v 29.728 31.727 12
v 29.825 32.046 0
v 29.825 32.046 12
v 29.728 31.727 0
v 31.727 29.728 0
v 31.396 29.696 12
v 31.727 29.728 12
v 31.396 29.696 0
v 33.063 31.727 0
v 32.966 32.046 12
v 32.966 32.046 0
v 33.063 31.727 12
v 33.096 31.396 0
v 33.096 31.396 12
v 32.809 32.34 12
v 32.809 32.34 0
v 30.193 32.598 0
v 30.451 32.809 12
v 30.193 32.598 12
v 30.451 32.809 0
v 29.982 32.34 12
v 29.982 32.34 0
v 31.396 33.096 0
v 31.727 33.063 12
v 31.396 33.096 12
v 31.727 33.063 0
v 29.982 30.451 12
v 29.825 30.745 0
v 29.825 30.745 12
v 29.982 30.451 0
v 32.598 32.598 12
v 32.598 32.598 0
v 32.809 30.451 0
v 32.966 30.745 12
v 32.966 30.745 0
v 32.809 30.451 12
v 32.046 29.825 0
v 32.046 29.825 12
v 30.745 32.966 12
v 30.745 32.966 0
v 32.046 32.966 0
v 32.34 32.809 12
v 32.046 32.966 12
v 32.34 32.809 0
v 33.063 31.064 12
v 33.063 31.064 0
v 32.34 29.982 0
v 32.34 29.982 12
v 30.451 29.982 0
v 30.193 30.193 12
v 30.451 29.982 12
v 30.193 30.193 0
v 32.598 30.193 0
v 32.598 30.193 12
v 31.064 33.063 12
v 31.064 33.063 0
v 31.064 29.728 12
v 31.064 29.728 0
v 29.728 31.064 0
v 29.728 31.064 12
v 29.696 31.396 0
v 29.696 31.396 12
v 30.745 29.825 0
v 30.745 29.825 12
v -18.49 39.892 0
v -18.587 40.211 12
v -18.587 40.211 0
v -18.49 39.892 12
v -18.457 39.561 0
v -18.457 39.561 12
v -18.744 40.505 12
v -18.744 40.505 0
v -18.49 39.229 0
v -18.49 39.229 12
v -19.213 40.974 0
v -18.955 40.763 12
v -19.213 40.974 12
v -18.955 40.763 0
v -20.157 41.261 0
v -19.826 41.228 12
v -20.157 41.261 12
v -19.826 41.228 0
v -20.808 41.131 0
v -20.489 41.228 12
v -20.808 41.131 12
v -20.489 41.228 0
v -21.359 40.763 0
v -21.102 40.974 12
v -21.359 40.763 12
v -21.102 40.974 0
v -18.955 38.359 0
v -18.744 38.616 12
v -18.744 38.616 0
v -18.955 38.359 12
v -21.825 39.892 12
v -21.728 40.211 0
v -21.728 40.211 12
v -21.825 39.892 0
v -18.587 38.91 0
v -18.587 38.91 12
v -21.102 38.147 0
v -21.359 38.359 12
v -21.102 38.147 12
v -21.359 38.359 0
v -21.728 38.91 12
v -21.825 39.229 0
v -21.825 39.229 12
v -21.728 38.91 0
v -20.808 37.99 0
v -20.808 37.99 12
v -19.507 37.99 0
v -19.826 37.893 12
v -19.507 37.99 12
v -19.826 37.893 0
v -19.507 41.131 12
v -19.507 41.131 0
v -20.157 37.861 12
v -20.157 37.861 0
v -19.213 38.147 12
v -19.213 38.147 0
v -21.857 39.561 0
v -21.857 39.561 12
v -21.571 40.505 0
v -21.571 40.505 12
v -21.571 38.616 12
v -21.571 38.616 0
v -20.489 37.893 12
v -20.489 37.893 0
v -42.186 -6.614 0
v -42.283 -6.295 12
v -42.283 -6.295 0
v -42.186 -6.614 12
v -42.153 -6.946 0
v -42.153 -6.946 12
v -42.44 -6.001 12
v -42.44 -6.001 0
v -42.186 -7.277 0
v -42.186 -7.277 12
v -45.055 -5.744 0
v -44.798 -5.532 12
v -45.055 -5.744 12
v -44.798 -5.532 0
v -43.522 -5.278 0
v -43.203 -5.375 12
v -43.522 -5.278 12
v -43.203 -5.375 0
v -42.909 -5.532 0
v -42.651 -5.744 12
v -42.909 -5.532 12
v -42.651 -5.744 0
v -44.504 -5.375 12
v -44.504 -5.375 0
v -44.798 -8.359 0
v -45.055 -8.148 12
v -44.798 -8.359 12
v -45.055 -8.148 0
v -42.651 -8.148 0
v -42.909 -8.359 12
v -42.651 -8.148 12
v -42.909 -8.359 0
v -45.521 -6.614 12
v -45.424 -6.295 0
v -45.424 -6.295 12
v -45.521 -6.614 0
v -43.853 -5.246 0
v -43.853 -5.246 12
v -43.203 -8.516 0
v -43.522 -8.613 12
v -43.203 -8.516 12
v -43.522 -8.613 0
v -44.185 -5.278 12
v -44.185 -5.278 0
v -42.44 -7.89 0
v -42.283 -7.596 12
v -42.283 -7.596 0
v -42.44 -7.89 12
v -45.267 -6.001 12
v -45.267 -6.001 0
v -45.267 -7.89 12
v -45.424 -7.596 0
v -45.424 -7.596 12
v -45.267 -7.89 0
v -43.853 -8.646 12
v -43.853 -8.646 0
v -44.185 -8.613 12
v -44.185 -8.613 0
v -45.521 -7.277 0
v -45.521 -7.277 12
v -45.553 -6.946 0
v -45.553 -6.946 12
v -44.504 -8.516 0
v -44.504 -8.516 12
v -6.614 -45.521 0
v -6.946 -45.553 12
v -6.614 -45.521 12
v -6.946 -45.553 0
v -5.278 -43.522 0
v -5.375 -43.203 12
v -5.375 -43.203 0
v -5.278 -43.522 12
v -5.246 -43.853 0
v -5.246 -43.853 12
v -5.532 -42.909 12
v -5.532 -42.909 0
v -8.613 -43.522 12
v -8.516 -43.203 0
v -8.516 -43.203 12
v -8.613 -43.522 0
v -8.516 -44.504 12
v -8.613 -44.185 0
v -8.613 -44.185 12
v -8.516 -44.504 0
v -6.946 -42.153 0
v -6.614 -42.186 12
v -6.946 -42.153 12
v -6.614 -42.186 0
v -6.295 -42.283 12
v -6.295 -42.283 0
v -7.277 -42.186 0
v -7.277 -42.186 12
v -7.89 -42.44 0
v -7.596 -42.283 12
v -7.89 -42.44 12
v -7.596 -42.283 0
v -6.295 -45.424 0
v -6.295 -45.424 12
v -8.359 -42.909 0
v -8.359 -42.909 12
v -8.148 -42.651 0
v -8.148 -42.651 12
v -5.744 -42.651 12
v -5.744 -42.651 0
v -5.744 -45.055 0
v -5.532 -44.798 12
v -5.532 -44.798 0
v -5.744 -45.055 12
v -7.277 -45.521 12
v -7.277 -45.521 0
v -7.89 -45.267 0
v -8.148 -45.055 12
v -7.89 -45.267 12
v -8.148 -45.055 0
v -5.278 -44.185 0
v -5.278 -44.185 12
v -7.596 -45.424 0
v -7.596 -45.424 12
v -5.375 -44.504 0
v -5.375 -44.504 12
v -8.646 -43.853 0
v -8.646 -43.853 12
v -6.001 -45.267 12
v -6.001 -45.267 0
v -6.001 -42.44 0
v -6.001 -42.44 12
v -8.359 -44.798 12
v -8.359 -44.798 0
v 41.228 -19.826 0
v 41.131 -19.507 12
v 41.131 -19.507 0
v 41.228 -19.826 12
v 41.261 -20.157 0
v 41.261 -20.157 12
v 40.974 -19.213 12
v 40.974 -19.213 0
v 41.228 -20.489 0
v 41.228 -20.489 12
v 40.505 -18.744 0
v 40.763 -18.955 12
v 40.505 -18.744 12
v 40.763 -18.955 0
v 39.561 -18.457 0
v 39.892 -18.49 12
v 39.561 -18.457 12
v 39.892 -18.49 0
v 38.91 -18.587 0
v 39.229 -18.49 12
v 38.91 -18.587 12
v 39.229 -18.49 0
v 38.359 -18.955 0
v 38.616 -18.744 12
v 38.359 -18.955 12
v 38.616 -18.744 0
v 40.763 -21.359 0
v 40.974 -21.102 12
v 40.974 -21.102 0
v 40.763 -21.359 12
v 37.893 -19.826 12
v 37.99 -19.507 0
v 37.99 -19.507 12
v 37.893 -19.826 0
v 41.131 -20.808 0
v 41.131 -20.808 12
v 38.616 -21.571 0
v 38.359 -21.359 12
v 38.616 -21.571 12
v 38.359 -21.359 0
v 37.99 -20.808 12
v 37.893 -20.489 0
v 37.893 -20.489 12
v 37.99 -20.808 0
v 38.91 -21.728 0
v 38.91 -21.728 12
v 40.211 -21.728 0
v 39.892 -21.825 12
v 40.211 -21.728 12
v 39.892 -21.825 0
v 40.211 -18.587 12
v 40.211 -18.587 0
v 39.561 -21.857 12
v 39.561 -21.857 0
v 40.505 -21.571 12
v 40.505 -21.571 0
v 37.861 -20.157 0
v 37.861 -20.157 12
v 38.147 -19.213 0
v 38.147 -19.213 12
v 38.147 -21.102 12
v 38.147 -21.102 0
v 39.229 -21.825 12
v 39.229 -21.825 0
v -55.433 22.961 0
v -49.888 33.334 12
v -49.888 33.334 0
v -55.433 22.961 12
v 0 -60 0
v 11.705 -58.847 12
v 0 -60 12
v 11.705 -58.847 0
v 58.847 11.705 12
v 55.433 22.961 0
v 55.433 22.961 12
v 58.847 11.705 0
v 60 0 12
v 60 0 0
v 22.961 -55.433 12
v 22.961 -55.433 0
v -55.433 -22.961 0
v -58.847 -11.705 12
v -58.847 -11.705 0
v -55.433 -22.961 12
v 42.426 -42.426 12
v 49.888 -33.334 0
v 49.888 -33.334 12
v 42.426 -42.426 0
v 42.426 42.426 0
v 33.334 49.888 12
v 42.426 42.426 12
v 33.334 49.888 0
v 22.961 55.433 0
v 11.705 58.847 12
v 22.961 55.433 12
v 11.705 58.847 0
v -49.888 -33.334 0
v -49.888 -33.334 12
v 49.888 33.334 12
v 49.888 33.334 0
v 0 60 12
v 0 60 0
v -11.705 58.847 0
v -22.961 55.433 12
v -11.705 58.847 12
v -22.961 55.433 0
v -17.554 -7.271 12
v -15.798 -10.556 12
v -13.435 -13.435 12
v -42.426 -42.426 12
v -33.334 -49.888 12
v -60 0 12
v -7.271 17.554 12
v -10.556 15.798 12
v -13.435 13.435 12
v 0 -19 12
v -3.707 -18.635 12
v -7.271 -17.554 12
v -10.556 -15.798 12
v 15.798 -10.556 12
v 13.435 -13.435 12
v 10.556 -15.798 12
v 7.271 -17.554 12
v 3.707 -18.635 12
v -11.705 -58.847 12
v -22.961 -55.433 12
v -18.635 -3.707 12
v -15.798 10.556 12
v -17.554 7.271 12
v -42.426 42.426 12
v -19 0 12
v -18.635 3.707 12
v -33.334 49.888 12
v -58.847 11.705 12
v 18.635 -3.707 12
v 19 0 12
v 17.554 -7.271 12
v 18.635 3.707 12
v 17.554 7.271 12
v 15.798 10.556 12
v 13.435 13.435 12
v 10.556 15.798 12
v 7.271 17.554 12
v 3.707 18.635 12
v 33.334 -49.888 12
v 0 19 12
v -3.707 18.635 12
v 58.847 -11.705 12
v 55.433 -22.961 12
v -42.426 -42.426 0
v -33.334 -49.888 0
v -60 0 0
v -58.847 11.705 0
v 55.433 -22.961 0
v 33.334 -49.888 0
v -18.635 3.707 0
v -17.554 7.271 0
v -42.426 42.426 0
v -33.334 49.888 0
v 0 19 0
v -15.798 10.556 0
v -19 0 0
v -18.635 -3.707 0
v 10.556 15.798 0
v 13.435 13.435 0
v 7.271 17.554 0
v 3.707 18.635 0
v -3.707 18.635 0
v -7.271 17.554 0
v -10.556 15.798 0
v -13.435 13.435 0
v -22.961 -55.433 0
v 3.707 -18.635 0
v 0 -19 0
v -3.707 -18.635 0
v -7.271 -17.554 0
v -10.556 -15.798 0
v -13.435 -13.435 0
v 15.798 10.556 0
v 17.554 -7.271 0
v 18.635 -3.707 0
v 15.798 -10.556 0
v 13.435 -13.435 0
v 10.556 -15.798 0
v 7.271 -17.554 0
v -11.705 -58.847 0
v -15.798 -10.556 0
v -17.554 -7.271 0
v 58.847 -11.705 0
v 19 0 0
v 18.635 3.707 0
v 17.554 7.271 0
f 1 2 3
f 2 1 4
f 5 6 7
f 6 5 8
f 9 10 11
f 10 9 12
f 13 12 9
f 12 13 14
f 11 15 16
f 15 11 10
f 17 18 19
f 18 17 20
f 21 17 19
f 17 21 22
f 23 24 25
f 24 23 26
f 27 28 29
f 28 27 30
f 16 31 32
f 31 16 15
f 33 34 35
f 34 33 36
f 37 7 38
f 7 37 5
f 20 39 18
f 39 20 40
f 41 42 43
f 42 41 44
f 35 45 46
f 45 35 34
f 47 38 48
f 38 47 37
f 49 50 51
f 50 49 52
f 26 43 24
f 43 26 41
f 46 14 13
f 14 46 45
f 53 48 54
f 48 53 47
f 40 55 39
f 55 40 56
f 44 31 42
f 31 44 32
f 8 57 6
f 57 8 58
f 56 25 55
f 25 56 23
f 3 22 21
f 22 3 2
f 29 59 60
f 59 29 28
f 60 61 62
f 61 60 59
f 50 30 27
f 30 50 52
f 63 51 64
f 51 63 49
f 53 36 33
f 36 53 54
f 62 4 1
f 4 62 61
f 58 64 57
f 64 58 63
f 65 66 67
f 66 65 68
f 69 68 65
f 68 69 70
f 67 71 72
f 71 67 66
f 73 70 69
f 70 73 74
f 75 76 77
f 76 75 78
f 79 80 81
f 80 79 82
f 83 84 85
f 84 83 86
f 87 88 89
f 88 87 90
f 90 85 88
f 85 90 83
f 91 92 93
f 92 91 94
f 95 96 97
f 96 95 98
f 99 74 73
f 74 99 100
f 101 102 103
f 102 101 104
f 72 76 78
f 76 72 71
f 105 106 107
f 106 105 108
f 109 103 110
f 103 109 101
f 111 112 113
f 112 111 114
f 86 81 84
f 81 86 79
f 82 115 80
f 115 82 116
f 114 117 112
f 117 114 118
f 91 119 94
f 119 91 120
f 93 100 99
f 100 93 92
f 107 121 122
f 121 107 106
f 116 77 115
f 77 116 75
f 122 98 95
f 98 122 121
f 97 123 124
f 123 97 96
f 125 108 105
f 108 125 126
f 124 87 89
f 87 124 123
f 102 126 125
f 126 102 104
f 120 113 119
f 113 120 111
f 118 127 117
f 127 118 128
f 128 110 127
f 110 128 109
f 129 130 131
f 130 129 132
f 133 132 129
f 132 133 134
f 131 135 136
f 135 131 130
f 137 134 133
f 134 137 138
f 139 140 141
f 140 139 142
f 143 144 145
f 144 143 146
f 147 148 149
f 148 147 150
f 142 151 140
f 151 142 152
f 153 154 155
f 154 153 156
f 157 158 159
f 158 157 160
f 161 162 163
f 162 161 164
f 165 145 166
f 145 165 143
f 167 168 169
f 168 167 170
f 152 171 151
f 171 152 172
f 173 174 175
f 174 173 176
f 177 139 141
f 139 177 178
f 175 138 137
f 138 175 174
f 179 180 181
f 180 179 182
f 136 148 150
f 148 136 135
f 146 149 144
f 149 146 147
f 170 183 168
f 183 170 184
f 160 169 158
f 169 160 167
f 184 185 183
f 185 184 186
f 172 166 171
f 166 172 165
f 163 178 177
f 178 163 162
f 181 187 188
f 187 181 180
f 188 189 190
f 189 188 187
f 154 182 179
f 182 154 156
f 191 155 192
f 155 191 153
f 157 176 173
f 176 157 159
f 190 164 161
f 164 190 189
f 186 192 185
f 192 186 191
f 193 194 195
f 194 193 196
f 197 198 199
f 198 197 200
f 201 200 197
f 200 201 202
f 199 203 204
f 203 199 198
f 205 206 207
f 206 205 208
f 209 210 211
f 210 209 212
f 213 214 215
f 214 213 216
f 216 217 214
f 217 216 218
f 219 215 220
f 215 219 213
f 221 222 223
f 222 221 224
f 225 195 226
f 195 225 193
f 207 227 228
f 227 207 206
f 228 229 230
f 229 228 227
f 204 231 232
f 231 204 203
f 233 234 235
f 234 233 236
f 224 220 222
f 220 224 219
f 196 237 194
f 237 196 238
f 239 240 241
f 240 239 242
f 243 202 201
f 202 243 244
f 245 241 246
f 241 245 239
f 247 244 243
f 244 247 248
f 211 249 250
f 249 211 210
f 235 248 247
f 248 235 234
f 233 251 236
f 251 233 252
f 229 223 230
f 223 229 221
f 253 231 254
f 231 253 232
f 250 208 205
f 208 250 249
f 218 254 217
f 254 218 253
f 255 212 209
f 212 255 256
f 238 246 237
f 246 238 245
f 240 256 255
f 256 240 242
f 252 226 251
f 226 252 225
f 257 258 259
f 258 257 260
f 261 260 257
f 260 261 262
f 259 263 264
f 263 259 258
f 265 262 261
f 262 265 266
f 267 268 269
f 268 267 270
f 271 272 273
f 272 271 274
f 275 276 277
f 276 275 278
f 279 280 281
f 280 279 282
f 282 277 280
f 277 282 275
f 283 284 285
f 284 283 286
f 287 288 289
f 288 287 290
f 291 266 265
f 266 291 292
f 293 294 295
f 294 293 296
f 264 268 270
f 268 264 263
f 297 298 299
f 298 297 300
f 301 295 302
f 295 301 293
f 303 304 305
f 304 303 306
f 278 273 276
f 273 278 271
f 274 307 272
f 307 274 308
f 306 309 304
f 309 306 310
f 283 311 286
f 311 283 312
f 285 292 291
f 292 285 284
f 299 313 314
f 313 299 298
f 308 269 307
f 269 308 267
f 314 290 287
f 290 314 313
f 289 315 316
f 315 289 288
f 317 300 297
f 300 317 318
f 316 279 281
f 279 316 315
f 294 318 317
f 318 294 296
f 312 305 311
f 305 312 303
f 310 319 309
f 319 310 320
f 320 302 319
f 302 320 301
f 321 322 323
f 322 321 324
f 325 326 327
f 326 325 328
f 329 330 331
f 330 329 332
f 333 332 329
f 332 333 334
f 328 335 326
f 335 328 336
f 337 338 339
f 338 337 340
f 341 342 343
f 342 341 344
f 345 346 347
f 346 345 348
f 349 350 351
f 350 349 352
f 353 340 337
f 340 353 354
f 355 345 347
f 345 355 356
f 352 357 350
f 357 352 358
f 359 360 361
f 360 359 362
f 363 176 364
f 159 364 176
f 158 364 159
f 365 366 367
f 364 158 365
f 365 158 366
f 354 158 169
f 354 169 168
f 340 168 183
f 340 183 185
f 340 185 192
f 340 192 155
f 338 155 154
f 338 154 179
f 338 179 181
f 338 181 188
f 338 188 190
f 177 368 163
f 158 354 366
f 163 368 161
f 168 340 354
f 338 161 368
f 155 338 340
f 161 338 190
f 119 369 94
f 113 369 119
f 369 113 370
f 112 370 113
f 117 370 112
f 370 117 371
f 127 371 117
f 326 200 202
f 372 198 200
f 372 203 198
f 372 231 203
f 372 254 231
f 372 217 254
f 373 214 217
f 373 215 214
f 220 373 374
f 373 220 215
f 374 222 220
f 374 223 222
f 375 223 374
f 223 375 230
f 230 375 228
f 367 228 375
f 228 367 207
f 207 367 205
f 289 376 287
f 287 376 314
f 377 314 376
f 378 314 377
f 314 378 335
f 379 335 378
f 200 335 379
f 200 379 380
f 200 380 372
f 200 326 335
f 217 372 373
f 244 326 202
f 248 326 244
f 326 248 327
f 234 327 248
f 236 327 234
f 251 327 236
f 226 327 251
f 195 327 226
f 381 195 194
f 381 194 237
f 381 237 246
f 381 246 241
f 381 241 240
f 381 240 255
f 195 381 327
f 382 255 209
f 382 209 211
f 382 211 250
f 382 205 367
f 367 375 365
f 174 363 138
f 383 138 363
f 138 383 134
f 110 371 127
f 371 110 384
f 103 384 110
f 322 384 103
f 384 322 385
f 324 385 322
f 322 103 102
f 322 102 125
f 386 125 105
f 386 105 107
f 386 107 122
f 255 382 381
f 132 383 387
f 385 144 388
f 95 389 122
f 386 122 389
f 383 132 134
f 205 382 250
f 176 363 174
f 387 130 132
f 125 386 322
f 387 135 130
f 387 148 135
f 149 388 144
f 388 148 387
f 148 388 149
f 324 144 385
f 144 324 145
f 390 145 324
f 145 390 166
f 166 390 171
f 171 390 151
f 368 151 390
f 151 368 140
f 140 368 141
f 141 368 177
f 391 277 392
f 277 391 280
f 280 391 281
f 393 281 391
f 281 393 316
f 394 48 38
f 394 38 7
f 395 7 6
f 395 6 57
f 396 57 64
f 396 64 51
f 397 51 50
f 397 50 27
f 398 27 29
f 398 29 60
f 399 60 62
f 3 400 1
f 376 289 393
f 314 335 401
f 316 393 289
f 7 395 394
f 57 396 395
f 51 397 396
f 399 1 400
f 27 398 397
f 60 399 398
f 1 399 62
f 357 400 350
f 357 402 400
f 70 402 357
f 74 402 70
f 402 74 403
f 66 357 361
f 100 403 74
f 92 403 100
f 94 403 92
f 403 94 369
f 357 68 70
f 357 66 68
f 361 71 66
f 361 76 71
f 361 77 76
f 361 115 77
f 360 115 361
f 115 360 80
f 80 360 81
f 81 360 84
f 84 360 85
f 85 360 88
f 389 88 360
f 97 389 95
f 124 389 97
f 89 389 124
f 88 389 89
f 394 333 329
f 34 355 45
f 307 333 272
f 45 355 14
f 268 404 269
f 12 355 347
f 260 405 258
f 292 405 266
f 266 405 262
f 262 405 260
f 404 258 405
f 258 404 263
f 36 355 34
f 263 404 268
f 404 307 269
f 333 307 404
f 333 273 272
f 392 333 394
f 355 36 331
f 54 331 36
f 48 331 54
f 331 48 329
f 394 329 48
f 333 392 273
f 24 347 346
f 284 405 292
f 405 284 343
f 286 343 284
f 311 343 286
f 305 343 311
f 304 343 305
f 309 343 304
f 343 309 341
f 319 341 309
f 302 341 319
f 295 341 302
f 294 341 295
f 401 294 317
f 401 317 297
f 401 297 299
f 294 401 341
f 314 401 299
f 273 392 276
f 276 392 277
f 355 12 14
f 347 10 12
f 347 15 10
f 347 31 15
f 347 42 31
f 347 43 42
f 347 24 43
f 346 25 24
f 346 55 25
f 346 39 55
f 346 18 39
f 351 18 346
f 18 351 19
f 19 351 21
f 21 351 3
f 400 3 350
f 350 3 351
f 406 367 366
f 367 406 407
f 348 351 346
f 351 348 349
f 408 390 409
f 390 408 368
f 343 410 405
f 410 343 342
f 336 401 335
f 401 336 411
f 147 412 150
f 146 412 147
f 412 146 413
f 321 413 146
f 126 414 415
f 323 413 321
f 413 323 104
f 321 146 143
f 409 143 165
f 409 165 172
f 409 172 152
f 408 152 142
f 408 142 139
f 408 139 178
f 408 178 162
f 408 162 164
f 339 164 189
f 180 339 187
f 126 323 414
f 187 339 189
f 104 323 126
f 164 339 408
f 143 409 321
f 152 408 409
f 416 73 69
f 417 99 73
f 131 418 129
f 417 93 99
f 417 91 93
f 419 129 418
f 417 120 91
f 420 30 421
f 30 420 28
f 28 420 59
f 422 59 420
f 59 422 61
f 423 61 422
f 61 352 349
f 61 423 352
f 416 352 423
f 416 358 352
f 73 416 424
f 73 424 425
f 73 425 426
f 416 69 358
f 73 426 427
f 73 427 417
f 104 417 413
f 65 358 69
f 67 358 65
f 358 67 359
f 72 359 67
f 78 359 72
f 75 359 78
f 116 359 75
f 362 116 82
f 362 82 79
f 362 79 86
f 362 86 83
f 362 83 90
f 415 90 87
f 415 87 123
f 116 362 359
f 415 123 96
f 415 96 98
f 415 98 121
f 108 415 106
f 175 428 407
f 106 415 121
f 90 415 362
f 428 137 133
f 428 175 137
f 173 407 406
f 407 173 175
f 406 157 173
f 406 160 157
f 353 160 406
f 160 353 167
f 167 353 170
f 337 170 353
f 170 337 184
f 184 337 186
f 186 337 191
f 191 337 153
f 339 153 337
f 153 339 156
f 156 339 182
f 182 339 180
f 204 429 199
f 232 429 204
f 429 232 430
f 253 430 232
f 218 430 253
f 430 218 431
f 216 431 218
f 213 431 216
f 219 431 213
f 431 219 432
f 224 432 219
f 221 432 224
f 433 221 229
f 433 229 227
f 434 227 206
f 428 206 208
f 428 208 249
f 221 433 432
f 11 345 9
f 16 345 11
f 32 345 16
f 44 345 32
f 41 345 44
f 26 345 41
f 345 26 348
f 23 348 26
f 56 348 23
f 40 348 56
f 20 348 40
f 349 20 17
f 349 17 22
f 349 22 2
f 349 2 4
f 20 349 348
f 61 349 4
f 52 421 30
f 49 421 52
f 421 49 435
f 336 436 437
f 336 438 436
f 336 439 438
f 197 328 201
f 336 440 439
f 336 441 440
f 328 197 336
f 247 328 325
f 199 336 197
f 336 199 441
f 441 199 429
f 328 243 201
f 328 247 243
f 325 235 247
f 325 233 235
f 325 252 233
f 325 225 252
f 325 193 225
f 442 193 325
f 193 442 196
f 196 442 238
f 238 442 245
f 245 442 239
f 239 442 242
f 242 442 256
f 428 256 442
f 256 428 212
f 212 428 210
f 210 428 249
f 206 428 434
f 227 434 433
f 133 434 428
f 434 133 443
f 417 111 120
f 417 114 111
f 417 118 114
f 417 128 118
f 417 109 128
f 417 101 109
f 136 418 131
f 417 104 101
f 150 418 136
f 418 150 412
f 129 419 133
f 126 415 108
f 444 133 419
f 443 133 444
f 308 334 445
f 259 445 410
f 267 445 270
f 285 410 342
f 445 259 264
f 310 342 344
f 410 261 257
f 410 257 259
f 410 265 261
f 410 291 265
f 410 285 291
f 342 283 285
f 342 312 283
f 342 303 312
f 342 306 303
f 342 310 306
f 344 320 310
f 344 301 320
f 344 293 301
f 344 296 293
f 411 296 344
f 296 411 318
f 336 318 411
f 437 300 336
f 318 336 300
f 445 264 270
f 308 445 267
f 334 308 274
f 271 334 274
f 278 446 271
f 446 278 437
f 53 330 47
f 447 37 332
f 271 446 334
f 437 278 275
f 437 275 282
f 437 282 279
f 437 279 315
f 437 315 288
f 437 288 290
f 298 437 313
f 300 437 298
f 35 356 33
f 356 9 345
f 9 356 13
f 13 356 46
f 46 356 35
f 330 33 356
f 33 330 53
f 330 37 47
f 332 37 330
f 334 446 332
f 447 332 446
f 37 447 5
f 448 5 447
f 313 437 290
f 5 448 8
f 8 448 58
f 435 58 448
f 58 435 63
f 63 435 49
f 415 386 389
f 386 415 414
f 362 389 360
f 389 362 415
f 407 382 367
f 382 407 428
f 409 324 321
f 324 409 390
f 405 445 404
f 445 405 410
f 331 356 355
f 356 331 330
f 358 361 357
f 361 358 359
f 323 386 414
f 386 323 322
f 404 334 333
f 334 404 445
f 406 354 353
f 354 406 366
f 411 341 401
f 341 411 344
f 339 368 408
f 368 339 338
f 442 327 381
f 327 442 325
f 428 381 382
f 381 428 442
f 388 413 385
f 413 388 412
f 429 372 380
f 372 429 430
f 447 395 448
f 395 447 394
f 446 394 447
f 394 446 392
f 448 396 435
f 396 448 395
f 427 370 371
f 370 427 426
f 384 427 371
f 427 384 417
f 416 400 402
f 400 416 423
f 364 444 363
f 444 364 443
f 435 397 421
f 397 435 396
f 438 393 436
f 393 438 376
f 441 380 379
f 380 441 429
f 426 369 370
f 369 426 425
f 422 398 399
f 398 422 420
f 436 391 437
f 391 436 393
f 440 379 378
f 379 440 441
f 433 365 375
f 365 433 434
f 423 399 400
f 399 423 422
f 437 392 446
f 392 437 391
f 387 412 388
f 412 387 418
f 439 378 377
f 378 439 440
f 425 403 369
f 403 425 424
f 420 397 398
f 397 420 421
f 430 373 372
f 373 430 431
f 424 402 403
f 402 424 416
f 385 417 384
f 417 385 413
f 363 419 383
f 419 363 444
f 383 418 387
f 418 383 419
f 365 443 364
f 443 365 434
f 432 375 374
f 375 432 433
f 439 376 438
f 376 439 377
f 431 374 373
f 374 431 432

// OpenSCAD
$fn = 32;

// ----------------------------------------------------------------------
// Flange Ø120 x 12
// 5 holes on a Ø88.8 bolt circle, bolted joints
// ----------------------------------------------------------------------

// --- parameters (mm) ---
flange_d = 120;  // outside diameter of the flange
thickness = 12;  // flange thickness
holes = 5;       // number of bolt holes
pcd = 88.8;      // bolt circle diameter
start_deg = 45;  // angle of the first hole, from +X
hole_d = 3.4;    // bolt hole diameter
bore_d = 38;     // central through bore
hub_d = 50;      // hub outside diameter
hub_h = 0;       // hub height above the flange face (0 = no hub)

// --- derived feature positions (mm) ---
height = thickness + hub_h;  // = 12   overall height of the part
pcd_r = pcd / 2;             // = 44.4   bolt circle radius
hole_step = 360 / holes;     // = 72   angular pitch
feature_centers = [
  [pcd_r * cos(start_deg + 0 * hole_step), pcd_r * sin(start_deg + 0 * hole_step)],
  [pcd_r * cos(start_deg + 1 * hole_step), pcd_r * sin(start_deg + 1 * hole_step)],
  [pcd_r * cos(start_deg + 2 * hole_step), pcd_r * sin(start_deg + 2 * hole_step)],
  [pcd_r * cos(start_deg + 3 * hole_step), pcd_r * sin(start_deg + 3 * hole_step)],
  [pcd_r * cos(start_deg + 4 * hole_step), pcd_r * sin(start_deg + 4 * hole_step)]
];   // bolt hole centres on the pitch circle

// flange disc, every hole and the bore cut straight through
difference() {
  union() {
    cylinder(d = flange_d, h = thickness);
  }
  translate([0, 0, -1]) cylinder(d = bore_d, h = height + 2);  // bore, through
  for (centre = feature_centers)
    translate([centre[0], centre[1], -1]) cylinder(d = hole_d, h = thickness + 2);
}
